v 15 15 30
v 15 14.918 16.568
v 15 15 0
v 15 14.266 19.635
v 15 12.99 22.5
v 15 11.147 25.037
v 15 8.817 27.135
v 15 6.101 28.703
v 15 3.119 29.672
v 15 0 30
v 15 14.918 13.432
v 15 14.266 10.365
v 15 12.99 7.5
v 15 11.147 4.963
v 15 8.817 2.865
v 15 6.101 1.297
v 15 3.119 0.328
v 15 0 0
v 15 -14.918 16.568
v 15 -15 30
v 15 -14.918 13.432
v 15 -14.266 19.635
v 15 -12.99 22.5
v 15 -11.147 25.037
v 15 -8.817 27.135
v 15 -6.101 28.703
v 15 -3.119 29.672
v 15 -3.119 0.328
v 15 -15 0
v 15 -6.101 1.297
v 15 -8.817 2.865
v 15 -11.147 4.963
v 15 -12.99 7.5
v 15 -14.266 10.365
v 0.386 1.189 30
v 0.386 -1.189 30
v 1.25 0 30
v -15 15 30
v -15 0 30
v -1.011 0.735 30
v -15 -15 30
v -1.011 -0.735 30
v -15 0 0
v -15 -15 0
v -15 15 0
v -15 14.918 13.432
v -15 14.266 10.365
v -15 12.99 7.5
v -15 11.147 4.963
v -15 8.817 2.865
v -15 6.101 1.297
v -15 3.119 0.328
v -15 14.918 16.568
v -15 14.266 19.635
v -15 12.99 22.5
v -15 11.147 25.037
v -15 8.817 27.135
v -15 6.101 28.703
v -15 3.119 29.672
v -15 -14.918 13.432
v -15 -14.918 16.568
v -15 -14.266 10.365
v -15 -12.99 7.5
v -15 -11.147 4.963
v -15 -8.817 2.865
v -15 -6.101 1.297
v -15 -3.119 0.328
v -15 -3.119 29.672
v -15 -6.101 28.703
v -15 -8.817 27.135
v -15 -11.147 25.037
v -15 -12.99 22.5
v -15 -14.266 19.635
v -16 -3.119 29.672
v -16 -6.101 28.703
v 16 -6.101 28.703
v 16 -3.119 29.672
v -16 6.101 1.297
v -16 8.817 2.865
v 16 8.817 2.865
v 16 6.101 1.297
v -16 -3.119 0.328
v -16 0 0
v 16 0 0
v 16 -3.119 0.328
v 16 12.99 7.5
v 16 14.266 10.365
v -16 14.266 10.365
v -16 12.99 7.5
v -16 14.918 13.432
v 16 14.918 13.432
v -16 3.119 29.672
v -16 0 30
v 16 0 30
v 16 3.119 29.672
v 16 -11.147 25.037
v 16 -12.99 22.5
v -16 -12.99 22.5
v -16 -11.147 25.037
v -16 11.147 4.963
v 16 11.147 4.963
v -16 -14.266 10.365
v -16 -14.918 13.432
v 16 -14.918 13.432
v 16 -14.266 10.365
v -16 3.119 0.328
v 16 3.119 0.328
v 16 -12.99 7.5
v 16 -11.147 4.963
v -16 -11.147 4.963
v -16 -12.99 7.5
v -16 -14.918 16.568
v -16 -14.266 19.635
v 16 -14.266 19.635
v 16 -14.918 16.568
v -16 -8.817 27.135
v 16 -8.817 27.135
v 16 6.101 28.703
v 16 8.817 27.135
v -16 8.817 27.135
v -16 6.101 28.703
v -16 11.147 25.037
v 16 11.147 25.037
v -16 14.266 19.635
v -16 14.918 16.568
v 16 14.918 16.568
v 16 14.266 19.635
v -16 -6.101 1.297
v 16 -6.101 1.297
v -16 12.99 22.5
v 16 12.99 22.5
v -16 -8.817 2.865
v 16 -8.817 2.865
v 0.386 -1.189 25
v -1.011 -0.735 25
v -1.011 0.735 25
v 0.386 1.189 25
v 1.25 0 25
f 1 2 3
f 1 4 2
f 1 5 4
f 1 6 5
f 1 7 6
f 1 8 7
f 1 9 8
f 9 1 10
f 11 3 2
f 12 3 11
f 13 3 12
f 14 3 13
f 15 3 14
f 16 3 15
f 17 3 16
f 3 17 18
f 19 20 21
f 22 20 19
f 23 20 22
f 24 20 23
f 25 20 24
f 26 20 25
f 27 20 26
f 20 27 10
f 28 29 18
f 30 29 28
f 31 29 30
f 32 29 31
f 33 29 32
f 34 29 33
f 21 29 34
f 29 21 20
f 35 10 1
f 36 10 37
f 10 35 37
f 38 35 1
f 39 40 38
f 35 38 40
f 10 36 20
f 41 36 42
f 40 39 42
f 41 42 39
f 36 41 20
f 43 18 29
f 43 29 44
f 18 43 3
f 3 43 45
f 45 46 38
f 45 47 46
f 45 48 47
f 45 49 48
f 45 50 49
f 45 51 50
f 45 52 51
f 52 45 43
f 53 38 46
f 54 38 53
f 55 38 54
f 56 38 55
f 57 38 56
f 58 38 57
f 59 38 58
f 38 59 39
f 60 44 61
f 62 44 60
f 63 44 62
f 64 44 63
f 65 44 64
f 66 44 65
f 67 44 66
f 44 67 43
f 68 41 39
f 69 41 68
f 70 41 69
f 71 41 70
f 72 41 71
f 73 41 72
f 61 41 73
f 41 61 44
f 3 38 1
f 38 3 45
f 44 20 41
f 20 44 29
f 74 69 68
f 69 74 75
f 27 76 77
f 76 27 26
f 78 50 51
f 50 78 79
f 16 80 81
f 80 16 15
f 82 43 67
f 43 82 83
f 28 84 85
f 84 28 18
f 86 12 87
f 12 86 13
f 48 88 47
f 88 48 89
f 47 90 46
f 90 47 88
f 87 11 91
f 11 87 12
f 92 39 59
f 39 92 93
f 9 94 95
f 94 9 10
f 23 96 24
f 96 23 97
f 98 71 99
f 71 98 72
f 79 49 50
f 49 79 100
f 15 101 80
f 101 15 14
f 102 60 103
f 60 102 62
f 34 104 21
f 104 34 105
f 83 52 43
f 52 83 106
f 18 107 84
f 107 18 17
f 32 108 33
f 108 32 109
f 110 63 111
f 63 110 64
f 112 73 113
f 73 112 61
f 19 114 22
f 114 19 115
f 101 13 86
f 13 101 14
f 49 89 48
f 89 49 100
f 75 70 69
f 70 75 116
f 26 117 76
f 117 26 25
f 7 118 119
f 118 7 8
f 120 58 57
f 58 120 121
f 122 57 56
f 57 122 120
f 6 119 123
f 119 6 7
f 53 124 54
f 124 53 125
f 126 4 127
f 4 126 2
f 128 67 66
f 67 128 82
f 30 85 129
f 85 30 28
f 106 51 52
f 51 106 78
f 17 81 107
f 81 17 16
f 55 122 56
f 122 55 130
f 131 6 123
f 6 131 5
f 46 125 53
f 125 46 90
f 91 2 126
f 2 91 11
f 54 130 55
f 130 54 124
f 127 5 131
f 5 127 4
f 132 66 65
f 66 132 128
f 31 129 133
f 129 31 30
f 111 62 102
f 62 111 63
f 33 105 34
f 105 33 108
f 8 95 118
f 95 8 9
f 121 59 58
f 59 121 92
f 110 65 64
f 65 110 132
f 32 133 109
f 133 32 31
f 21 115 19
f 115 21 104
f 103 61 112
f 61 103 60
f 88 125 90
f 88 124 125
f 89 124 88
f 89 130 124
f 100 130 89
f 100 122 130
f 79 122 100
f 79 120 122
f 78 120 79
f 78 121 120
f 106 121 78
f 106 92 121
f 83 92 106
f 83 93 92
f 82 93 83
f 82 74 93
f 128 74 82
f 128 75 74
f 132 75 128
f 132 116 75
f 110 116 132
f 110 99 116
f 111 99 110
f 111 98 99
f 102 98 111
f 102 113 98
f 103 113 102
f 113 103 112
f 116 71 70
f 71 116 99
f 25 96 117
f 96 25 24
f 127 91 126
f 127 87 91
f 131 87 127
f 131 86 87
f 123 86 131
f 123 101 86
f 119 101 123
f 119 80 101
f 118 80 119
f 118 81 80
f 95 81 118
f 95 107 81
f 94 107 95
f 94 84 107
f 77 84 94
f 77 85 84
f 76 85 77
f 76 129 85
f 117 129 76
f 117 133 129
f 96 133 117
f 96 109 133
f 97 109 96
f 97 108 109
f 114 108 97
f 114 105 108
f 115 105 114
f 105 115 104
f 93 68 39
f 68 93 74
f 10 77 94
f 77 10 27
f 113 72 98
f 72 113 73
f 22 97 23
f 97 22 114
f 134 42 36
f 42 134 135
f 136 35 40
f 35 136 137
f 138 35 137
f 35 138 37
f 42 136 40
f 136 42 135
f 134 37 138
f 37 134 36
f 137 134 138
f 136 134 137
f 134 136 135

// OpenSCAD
cube_size = 30; // [10:Small,20:Medium,30:Large]

hole_diameter = 2.5; 
hole_radius = hole_diameter/2;

// How deep should the center hole be?
hole_depth = 5; // [0,1,5,50]

show_wheels = "yes"; // [yes,no]

// How thick should the side wheels be?
wheel_thickness = 1; // [1:40]

// ignore this variable!
// foo=1;

// don't turn functions into params!
function BEZ03(u) = pow((1-u), 3);

// ignore variable values
bing = 3+4;
baz = 3 / hole_depth;

difference() {
  union() {
    translate([0, 0, cube_size/2]) cube([cube_size,cube_size,cube_size], center=true);
    if (show_wheels == "yes") {
      translate([0, 0, cube_size/2]) rotate([0, 90, 0]) {
        cylinder(r=cube_size/2, h=cube_size+(wheel_thickness*2), center=true);
      }
    }
  }
  translate([0, 0, cube_size-hole_depth]) cylinder(r=hole_radius, h=hole_depth);
}
        
